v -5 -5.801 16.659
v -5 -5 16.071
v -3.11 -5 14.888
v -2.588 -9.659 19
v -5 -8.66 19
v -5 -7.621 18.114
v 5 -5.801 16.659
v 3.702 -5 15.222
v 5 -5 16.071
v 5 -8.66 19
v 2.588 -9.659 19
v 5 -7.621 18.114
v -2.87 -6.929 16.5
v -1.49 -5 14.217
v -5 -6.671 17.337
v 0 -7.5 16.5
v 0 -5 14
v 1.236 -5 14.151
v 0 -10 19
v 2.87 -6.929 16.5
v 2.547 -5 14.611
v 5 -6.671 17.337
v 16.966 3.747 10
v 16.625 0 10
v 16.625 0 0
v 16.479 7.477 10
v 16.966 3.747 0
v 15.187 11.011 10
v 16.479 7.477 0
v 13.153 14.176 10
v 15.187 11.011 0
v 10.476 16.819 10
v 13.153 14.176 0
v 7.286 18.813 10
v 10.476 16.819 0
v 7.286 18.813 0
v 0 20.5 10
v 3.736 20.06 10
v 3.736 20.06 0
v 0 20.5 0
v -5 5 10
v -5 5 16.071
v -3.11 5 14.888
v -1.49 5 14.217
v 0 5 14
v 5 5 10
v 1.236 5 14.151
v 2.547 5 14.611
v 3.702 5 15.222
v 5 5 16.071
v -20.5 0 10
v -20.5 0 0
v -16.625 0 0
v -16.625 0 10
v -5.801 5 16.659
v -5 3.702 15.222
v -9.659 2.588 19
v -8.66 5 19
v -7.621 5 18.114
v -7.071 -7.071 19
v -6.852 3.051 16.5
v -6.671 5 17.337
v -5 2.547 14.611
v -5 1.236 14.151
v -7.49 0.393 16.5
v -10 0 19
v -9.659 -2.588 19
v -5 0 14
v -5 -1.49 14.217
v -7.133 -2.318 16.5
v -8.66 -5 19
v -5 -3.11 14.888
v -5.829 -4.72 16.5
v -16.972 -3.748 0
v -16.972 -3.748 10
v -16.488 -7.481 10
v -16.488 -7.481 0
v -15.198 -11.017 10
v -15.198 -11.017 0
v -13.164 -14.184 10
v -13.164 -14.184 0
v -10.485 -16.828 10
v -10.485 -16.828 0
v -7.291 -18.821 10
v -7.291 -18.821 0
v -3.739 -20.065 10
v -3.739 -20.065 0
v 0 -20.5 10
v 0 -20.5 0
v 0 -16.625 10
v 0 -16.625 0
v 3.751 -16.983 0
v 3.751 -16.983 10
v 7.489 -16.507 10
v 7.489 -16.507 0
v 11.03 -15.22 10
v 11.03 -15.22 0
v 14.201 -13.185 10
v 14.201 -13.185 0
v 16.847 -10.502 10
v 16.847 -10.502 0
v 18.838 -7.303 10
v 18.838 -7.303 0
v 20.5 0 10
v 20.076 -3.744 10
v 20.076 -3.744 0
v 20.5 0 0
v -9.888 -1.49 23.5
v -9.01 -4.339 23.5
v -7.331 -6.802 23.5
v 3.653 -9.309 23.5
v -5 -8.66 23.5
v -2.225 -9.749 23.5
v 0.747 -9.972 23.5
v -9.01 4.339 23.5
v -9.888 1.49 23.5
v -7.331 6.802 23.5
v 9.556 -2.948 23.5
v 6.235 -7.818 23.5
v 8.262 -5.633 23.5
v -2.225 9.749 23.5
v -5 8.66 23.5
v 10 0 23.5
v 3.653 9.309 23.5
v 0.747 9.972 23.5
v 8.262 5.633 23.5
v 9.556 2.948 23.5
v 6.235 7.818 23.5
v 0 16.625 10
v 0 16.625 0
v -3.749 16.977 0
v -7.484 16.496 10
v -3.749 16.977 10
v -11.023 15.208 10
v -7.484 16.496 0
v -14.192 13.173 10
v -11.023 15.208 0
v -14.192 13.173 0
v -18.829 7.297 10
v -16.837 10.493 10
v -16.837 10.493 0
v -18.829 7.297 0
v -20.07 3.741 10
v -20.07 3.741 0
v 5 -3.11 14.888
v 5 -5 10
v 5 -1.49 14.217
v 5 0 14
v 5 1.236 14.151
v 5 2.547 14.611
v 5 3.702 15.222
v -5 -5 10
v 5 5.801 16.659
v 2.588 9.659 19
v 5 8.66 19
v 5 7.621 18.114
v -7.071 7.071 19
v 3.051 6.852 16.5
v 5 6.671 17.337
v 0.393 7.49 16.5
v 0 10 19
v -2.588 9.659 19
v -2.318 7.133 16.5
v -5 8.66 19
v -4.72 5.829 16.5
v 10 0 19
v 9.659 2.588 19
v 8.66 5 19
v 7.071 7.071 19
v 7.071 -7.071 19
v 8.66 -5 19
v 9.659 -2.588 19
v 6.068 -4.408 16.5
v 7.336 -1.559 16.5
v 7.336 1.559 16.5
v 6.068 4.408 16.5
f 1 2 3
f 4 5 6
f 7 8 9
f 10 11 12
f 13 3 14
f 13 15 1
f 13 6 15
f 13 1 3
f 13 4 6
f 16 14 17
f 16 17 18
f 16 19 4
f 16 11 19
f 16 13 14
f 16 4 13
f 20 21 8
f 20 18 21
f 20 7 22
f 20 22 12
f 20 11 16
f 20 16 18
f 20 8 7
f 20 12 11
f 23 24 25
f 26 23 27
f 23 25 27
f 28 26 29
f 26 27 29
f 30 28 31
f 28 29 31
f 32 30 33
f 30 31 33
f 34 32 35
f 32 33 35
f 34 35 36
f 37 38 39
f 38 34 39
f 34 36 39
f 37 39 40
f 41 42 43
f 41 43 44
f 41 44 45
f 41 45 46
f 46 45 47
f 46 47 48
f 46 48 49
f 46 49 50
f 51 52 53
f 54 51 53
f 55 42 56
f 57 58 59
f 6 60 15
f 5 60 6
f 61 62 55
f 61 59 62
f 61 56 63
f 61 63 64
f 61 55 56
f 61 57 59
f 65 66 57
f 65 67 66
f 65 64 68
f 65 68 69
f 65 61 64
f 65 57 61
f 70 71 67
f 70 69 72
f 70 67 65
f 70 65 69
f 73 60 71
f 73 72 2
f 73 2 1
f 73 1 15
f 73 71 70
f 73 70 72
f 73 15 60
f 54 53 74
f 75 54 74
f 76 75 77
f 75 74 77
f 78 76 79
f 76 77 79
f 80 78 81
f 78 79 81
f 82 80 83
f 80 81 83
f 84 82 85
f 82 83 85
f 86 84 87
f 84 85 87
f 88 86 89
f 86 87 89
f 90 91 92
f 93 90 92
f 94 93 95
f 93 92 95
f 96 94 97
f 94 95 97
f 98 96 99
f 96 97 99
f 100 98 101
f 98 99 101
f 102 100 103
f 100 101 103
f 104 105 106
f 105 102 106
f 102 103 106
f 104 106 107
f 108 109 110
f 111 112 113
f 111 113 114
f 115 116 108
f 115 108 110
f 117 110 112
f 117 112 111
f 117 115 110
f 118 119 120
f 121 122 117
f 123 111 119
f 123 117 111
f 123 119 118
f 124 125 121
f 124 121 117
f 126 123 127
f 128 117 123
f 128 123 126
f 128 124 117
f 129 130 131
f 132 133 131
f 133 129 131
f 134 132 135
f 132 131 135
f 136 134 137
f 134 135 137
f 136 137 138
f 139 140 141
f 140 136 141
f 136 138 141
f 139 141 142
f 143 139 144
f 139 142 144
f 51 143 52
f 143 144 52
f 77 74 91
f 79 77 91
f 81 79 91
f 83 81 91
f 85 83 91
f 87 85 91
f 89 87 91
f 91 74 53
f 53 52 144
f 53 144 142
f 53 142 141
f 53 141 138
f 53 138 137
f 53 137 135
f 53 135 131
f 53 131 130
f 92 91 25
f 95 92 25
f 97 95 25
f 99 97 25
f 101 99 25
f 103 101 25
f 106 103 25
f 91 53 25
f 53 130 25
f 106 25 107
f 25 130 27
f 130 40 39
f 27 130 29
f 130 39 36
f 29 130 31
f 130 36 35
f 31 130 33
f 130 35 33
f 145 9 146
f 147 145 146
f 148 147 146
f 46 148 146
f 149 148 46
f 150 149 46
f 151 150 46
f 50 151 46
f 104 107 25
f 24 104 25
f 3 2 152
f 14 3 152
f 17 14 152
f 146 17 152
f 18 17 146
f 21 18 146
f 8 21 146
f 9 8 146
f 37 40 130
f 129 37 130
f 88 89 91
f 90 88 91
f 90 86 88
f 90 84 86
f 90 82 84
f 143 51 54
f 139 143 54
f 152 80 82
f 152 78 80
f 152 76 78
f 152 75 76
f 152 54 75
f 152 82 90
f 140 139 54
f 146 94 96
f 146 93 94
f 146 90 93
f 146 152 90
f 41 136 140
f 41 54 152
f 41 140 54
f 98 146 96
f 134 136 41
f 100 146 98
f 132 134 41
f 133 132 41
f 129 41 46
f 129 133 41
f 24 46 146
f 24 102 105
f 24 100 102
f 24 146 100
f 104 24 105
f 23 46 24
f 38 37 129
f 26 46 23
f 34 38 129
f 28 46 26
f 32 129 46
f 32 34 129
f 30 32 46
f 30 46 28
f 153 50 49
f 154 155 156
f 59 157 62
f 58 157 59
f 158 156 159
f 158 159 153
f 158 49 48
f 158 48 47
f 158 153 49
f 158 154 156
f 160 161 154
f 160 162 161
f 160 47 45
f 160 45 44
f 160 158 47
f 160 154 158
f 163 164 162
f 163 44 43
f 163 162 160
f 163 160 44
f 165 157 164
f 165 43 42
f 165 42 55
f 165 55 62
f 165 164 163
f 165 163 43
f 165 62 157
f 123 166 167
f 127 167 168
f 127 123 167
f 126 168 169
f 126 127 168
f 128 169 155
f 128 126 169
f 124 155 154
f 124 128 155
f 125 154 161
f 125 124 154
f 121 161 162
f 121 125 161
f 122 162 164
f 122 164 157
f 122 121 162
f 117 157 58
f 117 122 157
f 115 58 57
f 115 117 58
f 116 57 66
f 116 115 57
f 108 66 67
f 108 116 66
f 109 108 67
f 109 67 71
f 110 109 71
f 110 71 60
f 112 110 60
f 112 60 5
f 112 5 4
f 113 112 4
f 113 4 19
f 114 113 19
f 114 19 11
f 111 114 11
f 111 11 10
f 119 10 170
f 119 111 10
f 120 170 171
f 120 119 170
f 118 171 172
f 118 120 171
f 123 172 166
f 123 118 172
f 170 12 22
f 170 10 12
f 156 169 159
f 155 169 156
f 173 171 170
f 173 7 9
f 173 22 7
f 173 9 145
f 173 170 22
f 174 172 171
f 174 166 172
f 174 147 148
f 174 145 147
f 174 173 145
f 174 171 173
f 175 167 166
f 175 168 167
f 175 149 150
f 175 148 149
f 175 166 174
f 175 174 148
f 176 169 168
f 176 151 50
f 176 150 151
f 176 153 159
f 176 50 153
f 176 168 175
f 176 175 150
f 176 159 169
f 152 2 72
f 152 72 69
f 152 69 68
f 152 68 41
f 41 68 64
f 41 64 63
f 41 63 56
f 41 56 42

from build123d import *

# Parameters (mm, degrees)
F0_W     = 41
F0_H     = 41
F0_W_2   = 10
F0_H_2   = 10
F1_DEPTH = 10
F2_DEPTH = 25
F3_R     = 10
F4_DEPTH = 8
F6_DEPTH = 25
F7_DEPTH = 1.5
F8_DEPTH = 3


# Not quite as in the source:
# - a fillet or chamfer that OpenCascade refuses, or shapes differently, is made with other operations: its cross-section is extruded or revolved along the edge and cut away or added


with BuildPart() as f1:
    # F0 (on Top) → F1 (new body)
    with BuildSketch(Plane.XY):
        Rectangle(F0_W, F0_H)
        Rectangle(F0_W_2, F0_H_2, mode=Mode.SUBTRACT)
        Rectangle(F0_W_2, F0_H_2)
    extrude(amount=F1_DEPTH)

    # F0 (on Top) → F2 (join)
    with BuildSketch(Plane.XY):
        Rectangle(F0_W_2, F0_H_2)
    extrude(amount=F2_DEPTH)

    # F3 (on face) → F4 (join)
    with BuildSketch(Plane.XY.offset(25)):
        Circle(F3_R)
    extrude(amount=-F4_DEPTH)

    # F5 (on face) → F6 (cut)
    with BuildSketch(Plane(origin=(0, 0, 0), x_dir=(1, 0, 0), z_dir=(0, 0, -1))):
        with BuildLine():
            Line((0, 20.5), (0, 16.625))
            ThreePointArc((0, 16.625), (14.2014511666, 13.1849661001), (20.5, 0))
            Line((20.5, 0), (20.5, 20.5))
            Line((20.5, 20.5), (0, 20.5))
        make_face()
        with BuildLine():
            Line((20.5, -20.5), (20.5, 0))
            Line((20.5, 0), (16.625, 0))
            ThreePointArc((16.625, 0), (13.15340166, -14.1758531755), (0, -20.5))
            Line((0, -20.5), (20.5, -20.5))
        make_face()
        with BuildLine():
            ThreePointArc((0, -16.625), (-14.1919455674, -13.1732449101), (-20.5, 0))
            Line((-20.5, 0), (-20.5, -20.5))
            Line((-20.5, -20.5), (0, -20.5))
            Line((0, -20.5), (0, -16.625))
        make_face()
        with BuildLine():
            ThreePointArc((-16.625, 0), (-13.1636820987, 14.1841903605), (0, 20.5))
            Line((0, 20.5), (-20.5, 20.5))
            Line((-20.5, 20.5), (-20.5, 0))
            Line((-20.5, 0), (-16.625, 0))
        make_face()
    extrude(amount=-F6_DEPTH, mode=Mode.SUBTRACT)

    # F7 (cut): a face of the model
    f7_faces = [f1.faces().sort_by_distance(p)[0] for p in [
        (0, 0, 25),
    ]]
    extrude(f7_faces, amount=-F7_DEPTH, mode=Mode.SUBTRACT)

    # F8 (add): a face of the model
    f8_faces = [f1.faces().sort_by_distance(p)[0] for p in [
        (-9.7171572875, 0, 17),
    ]]
    extrude(f8_faces, amount=F8_DEPTH)

    # F9: chamfer of 5 on 1 edges, made by hand


with BuildPart() as f9_tool2:
    # F9_s3 → F9_t4 (revolve)
    with BuildSketch(Plane.XZ):
        Polygon((5, 14), (10, 19), (10, 14), align=None)
    revolve(axis=Axis((0, 0, 14), (0, 0, 1)))

    split(bisect_by=Plane.YZ.offset(5), keep=Keep.TOP)


with BuildPart() as f1_1:
    add(f1.part)

    # F9_t1: cut F9_tool2
    add(f9_tool2.part, mode=Mode.SUBTRACT)


with BuildPart() as f9_tool7:
    # F9_s8 → F9_t9 (revolve)
    with BuildSketch(Plane.XZ):
        Polygon((5, 14), (10, 19), (10, 14), align=None)
    revolve(axis=Axis((0, 0, 14), (0, 0, 1)))

    split(bisect_by=Plane.XZ.offset(-5), keep=Keep.BOTTOM)


with BuildPart() as f1_2:
    add(f1_1.part)

    # F9_t6: cut F9_tool7
    add(f9_tool7.part, mode=Mode.SUBTRACT)


with BuildPart() as f9_tool12:
    # F9_s13 → F9_t14 (revolve)
    with BuildSketch(Plane.XZ):
        Polygon((5, 14), (10, 19), (10, 14), align=None)
    revolve(axis=Axis((0, 0, 14), (0, 0, 1)))

    split(bisect_by=Plane.YZ.offset(-5), keep=Keep.BOTTOM)


with BuildPart() as f1_3:
    add(f1_2.part)

    # F9_t11: cut F9_tool12
    add(f9_tool12.part, mode=Mode.SUBTRACT)


with BuildPart() as f9_tool17:
    # F9_s18 → F9_t19 (revolve)
    with BuildSketch(Plane.XZ):
        Polygon((5, 14), (10, 19), (10, 14), align=None)
    revolve(axis=Axis((0, 0, 14), (0, 0, 1)))

    split(bisect_by=Plane.XZ.offset(5), keep=Keep.TOP)


with BuildPart() as f1_4:
    add(f1_3.part)

    # F9_t16: cut F9_tool17
    add(f9_tool17.part, mode=Mode.SUBTRACT)


solid = f1_4.part
